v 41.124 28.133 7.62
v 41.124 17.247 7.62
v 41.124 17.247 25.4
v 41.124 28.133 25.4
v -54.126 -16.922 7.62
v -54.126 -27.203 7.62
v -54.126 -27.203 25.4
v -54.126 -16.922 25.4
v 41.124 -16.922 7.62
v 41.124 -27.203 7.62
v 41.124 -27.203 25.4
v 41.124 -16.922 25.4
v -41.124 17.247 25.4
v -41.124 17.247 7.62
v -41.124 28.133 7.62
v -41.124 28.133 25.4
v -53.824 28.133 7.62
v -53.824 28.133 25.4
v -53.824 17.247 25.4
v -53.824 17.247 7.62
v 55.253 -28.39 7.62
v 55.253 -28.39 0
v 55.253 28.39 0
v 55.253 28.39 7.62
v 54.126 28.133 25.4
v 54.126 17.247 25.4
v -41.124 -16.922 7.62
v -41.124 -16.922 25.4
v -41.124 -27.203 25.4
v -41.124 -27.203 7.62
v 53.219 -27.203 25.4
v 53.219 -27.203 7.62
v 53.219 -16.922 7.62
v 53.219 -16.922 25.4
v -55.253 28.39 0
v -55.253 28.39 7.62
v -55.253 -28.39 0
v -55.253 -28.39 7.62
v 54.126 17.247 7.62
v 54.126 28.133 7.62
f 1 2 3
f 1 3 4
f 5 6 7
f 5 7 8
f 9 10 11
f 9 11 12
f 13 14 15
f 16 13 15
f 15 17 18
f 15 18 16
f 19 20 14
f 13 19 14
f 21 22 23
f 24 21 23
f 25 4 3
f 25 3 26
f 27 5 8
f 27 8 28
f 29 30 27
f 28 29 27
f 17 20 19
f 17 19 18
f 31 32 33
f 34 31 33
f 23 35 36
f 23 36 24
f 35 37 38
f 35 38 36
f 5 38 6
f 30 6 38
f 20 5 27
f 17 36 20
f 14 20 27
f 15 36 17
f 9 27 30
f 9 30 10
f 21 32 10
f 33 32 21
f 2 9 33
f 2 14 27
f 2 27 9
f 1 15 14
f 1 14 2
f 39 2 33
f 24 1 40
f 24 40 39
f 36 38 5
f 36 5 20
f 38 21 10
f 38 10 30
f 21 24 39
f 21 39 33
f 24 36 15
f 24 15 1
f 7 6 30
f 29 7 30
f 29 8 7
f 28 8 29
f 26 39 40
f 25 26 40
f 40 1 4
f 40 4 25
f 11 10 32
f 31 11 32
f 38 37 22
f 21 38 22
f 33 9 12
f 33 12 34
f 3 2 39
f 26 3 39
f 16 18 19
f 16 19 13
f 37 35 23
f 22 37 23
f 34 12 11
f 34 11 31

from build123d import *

# Parameters (mm, degrees)
F0_W     = 110.50678
F0_H     = 56.779732
F3_DEPTH = 7.62
F1_W     = 13.002377
F1_H     = 10.885713
F1_W_2   = 12.095236
F1_H_2   = 10.280952
F1_W_3   = 13.002384
F1_W_4   = 12.7
F4_DEPTH = 25.4


with BuildPart() as f3:
    # F0 (on Top) → F3 (new body)
    with BuildSketch(Plane.XY):
        Rectangle(F0_W, F0_H)
    extrude(amount=F3_DEPTH)

    # F1 (on face) → F4 (join)
    with BuildSketch(Plane.XY):
        with Locations((47.624995, 22.690022)):
            Rectangle(F1_W, F1_H)
        with Locations((47.171425, -22.062356)):
            Rectangle(F1_W_2, F1_H_2)
        with Locations((-47.624999, -22.062356)):
            Rectangle(F1_W_3, F1_H_2)
        with Locations((-47.473807, 22.690022)):
            Rectangle(F1_W_4, F1_H)
    extrude(amount=F4_DEPTH)


solid = f3.part
